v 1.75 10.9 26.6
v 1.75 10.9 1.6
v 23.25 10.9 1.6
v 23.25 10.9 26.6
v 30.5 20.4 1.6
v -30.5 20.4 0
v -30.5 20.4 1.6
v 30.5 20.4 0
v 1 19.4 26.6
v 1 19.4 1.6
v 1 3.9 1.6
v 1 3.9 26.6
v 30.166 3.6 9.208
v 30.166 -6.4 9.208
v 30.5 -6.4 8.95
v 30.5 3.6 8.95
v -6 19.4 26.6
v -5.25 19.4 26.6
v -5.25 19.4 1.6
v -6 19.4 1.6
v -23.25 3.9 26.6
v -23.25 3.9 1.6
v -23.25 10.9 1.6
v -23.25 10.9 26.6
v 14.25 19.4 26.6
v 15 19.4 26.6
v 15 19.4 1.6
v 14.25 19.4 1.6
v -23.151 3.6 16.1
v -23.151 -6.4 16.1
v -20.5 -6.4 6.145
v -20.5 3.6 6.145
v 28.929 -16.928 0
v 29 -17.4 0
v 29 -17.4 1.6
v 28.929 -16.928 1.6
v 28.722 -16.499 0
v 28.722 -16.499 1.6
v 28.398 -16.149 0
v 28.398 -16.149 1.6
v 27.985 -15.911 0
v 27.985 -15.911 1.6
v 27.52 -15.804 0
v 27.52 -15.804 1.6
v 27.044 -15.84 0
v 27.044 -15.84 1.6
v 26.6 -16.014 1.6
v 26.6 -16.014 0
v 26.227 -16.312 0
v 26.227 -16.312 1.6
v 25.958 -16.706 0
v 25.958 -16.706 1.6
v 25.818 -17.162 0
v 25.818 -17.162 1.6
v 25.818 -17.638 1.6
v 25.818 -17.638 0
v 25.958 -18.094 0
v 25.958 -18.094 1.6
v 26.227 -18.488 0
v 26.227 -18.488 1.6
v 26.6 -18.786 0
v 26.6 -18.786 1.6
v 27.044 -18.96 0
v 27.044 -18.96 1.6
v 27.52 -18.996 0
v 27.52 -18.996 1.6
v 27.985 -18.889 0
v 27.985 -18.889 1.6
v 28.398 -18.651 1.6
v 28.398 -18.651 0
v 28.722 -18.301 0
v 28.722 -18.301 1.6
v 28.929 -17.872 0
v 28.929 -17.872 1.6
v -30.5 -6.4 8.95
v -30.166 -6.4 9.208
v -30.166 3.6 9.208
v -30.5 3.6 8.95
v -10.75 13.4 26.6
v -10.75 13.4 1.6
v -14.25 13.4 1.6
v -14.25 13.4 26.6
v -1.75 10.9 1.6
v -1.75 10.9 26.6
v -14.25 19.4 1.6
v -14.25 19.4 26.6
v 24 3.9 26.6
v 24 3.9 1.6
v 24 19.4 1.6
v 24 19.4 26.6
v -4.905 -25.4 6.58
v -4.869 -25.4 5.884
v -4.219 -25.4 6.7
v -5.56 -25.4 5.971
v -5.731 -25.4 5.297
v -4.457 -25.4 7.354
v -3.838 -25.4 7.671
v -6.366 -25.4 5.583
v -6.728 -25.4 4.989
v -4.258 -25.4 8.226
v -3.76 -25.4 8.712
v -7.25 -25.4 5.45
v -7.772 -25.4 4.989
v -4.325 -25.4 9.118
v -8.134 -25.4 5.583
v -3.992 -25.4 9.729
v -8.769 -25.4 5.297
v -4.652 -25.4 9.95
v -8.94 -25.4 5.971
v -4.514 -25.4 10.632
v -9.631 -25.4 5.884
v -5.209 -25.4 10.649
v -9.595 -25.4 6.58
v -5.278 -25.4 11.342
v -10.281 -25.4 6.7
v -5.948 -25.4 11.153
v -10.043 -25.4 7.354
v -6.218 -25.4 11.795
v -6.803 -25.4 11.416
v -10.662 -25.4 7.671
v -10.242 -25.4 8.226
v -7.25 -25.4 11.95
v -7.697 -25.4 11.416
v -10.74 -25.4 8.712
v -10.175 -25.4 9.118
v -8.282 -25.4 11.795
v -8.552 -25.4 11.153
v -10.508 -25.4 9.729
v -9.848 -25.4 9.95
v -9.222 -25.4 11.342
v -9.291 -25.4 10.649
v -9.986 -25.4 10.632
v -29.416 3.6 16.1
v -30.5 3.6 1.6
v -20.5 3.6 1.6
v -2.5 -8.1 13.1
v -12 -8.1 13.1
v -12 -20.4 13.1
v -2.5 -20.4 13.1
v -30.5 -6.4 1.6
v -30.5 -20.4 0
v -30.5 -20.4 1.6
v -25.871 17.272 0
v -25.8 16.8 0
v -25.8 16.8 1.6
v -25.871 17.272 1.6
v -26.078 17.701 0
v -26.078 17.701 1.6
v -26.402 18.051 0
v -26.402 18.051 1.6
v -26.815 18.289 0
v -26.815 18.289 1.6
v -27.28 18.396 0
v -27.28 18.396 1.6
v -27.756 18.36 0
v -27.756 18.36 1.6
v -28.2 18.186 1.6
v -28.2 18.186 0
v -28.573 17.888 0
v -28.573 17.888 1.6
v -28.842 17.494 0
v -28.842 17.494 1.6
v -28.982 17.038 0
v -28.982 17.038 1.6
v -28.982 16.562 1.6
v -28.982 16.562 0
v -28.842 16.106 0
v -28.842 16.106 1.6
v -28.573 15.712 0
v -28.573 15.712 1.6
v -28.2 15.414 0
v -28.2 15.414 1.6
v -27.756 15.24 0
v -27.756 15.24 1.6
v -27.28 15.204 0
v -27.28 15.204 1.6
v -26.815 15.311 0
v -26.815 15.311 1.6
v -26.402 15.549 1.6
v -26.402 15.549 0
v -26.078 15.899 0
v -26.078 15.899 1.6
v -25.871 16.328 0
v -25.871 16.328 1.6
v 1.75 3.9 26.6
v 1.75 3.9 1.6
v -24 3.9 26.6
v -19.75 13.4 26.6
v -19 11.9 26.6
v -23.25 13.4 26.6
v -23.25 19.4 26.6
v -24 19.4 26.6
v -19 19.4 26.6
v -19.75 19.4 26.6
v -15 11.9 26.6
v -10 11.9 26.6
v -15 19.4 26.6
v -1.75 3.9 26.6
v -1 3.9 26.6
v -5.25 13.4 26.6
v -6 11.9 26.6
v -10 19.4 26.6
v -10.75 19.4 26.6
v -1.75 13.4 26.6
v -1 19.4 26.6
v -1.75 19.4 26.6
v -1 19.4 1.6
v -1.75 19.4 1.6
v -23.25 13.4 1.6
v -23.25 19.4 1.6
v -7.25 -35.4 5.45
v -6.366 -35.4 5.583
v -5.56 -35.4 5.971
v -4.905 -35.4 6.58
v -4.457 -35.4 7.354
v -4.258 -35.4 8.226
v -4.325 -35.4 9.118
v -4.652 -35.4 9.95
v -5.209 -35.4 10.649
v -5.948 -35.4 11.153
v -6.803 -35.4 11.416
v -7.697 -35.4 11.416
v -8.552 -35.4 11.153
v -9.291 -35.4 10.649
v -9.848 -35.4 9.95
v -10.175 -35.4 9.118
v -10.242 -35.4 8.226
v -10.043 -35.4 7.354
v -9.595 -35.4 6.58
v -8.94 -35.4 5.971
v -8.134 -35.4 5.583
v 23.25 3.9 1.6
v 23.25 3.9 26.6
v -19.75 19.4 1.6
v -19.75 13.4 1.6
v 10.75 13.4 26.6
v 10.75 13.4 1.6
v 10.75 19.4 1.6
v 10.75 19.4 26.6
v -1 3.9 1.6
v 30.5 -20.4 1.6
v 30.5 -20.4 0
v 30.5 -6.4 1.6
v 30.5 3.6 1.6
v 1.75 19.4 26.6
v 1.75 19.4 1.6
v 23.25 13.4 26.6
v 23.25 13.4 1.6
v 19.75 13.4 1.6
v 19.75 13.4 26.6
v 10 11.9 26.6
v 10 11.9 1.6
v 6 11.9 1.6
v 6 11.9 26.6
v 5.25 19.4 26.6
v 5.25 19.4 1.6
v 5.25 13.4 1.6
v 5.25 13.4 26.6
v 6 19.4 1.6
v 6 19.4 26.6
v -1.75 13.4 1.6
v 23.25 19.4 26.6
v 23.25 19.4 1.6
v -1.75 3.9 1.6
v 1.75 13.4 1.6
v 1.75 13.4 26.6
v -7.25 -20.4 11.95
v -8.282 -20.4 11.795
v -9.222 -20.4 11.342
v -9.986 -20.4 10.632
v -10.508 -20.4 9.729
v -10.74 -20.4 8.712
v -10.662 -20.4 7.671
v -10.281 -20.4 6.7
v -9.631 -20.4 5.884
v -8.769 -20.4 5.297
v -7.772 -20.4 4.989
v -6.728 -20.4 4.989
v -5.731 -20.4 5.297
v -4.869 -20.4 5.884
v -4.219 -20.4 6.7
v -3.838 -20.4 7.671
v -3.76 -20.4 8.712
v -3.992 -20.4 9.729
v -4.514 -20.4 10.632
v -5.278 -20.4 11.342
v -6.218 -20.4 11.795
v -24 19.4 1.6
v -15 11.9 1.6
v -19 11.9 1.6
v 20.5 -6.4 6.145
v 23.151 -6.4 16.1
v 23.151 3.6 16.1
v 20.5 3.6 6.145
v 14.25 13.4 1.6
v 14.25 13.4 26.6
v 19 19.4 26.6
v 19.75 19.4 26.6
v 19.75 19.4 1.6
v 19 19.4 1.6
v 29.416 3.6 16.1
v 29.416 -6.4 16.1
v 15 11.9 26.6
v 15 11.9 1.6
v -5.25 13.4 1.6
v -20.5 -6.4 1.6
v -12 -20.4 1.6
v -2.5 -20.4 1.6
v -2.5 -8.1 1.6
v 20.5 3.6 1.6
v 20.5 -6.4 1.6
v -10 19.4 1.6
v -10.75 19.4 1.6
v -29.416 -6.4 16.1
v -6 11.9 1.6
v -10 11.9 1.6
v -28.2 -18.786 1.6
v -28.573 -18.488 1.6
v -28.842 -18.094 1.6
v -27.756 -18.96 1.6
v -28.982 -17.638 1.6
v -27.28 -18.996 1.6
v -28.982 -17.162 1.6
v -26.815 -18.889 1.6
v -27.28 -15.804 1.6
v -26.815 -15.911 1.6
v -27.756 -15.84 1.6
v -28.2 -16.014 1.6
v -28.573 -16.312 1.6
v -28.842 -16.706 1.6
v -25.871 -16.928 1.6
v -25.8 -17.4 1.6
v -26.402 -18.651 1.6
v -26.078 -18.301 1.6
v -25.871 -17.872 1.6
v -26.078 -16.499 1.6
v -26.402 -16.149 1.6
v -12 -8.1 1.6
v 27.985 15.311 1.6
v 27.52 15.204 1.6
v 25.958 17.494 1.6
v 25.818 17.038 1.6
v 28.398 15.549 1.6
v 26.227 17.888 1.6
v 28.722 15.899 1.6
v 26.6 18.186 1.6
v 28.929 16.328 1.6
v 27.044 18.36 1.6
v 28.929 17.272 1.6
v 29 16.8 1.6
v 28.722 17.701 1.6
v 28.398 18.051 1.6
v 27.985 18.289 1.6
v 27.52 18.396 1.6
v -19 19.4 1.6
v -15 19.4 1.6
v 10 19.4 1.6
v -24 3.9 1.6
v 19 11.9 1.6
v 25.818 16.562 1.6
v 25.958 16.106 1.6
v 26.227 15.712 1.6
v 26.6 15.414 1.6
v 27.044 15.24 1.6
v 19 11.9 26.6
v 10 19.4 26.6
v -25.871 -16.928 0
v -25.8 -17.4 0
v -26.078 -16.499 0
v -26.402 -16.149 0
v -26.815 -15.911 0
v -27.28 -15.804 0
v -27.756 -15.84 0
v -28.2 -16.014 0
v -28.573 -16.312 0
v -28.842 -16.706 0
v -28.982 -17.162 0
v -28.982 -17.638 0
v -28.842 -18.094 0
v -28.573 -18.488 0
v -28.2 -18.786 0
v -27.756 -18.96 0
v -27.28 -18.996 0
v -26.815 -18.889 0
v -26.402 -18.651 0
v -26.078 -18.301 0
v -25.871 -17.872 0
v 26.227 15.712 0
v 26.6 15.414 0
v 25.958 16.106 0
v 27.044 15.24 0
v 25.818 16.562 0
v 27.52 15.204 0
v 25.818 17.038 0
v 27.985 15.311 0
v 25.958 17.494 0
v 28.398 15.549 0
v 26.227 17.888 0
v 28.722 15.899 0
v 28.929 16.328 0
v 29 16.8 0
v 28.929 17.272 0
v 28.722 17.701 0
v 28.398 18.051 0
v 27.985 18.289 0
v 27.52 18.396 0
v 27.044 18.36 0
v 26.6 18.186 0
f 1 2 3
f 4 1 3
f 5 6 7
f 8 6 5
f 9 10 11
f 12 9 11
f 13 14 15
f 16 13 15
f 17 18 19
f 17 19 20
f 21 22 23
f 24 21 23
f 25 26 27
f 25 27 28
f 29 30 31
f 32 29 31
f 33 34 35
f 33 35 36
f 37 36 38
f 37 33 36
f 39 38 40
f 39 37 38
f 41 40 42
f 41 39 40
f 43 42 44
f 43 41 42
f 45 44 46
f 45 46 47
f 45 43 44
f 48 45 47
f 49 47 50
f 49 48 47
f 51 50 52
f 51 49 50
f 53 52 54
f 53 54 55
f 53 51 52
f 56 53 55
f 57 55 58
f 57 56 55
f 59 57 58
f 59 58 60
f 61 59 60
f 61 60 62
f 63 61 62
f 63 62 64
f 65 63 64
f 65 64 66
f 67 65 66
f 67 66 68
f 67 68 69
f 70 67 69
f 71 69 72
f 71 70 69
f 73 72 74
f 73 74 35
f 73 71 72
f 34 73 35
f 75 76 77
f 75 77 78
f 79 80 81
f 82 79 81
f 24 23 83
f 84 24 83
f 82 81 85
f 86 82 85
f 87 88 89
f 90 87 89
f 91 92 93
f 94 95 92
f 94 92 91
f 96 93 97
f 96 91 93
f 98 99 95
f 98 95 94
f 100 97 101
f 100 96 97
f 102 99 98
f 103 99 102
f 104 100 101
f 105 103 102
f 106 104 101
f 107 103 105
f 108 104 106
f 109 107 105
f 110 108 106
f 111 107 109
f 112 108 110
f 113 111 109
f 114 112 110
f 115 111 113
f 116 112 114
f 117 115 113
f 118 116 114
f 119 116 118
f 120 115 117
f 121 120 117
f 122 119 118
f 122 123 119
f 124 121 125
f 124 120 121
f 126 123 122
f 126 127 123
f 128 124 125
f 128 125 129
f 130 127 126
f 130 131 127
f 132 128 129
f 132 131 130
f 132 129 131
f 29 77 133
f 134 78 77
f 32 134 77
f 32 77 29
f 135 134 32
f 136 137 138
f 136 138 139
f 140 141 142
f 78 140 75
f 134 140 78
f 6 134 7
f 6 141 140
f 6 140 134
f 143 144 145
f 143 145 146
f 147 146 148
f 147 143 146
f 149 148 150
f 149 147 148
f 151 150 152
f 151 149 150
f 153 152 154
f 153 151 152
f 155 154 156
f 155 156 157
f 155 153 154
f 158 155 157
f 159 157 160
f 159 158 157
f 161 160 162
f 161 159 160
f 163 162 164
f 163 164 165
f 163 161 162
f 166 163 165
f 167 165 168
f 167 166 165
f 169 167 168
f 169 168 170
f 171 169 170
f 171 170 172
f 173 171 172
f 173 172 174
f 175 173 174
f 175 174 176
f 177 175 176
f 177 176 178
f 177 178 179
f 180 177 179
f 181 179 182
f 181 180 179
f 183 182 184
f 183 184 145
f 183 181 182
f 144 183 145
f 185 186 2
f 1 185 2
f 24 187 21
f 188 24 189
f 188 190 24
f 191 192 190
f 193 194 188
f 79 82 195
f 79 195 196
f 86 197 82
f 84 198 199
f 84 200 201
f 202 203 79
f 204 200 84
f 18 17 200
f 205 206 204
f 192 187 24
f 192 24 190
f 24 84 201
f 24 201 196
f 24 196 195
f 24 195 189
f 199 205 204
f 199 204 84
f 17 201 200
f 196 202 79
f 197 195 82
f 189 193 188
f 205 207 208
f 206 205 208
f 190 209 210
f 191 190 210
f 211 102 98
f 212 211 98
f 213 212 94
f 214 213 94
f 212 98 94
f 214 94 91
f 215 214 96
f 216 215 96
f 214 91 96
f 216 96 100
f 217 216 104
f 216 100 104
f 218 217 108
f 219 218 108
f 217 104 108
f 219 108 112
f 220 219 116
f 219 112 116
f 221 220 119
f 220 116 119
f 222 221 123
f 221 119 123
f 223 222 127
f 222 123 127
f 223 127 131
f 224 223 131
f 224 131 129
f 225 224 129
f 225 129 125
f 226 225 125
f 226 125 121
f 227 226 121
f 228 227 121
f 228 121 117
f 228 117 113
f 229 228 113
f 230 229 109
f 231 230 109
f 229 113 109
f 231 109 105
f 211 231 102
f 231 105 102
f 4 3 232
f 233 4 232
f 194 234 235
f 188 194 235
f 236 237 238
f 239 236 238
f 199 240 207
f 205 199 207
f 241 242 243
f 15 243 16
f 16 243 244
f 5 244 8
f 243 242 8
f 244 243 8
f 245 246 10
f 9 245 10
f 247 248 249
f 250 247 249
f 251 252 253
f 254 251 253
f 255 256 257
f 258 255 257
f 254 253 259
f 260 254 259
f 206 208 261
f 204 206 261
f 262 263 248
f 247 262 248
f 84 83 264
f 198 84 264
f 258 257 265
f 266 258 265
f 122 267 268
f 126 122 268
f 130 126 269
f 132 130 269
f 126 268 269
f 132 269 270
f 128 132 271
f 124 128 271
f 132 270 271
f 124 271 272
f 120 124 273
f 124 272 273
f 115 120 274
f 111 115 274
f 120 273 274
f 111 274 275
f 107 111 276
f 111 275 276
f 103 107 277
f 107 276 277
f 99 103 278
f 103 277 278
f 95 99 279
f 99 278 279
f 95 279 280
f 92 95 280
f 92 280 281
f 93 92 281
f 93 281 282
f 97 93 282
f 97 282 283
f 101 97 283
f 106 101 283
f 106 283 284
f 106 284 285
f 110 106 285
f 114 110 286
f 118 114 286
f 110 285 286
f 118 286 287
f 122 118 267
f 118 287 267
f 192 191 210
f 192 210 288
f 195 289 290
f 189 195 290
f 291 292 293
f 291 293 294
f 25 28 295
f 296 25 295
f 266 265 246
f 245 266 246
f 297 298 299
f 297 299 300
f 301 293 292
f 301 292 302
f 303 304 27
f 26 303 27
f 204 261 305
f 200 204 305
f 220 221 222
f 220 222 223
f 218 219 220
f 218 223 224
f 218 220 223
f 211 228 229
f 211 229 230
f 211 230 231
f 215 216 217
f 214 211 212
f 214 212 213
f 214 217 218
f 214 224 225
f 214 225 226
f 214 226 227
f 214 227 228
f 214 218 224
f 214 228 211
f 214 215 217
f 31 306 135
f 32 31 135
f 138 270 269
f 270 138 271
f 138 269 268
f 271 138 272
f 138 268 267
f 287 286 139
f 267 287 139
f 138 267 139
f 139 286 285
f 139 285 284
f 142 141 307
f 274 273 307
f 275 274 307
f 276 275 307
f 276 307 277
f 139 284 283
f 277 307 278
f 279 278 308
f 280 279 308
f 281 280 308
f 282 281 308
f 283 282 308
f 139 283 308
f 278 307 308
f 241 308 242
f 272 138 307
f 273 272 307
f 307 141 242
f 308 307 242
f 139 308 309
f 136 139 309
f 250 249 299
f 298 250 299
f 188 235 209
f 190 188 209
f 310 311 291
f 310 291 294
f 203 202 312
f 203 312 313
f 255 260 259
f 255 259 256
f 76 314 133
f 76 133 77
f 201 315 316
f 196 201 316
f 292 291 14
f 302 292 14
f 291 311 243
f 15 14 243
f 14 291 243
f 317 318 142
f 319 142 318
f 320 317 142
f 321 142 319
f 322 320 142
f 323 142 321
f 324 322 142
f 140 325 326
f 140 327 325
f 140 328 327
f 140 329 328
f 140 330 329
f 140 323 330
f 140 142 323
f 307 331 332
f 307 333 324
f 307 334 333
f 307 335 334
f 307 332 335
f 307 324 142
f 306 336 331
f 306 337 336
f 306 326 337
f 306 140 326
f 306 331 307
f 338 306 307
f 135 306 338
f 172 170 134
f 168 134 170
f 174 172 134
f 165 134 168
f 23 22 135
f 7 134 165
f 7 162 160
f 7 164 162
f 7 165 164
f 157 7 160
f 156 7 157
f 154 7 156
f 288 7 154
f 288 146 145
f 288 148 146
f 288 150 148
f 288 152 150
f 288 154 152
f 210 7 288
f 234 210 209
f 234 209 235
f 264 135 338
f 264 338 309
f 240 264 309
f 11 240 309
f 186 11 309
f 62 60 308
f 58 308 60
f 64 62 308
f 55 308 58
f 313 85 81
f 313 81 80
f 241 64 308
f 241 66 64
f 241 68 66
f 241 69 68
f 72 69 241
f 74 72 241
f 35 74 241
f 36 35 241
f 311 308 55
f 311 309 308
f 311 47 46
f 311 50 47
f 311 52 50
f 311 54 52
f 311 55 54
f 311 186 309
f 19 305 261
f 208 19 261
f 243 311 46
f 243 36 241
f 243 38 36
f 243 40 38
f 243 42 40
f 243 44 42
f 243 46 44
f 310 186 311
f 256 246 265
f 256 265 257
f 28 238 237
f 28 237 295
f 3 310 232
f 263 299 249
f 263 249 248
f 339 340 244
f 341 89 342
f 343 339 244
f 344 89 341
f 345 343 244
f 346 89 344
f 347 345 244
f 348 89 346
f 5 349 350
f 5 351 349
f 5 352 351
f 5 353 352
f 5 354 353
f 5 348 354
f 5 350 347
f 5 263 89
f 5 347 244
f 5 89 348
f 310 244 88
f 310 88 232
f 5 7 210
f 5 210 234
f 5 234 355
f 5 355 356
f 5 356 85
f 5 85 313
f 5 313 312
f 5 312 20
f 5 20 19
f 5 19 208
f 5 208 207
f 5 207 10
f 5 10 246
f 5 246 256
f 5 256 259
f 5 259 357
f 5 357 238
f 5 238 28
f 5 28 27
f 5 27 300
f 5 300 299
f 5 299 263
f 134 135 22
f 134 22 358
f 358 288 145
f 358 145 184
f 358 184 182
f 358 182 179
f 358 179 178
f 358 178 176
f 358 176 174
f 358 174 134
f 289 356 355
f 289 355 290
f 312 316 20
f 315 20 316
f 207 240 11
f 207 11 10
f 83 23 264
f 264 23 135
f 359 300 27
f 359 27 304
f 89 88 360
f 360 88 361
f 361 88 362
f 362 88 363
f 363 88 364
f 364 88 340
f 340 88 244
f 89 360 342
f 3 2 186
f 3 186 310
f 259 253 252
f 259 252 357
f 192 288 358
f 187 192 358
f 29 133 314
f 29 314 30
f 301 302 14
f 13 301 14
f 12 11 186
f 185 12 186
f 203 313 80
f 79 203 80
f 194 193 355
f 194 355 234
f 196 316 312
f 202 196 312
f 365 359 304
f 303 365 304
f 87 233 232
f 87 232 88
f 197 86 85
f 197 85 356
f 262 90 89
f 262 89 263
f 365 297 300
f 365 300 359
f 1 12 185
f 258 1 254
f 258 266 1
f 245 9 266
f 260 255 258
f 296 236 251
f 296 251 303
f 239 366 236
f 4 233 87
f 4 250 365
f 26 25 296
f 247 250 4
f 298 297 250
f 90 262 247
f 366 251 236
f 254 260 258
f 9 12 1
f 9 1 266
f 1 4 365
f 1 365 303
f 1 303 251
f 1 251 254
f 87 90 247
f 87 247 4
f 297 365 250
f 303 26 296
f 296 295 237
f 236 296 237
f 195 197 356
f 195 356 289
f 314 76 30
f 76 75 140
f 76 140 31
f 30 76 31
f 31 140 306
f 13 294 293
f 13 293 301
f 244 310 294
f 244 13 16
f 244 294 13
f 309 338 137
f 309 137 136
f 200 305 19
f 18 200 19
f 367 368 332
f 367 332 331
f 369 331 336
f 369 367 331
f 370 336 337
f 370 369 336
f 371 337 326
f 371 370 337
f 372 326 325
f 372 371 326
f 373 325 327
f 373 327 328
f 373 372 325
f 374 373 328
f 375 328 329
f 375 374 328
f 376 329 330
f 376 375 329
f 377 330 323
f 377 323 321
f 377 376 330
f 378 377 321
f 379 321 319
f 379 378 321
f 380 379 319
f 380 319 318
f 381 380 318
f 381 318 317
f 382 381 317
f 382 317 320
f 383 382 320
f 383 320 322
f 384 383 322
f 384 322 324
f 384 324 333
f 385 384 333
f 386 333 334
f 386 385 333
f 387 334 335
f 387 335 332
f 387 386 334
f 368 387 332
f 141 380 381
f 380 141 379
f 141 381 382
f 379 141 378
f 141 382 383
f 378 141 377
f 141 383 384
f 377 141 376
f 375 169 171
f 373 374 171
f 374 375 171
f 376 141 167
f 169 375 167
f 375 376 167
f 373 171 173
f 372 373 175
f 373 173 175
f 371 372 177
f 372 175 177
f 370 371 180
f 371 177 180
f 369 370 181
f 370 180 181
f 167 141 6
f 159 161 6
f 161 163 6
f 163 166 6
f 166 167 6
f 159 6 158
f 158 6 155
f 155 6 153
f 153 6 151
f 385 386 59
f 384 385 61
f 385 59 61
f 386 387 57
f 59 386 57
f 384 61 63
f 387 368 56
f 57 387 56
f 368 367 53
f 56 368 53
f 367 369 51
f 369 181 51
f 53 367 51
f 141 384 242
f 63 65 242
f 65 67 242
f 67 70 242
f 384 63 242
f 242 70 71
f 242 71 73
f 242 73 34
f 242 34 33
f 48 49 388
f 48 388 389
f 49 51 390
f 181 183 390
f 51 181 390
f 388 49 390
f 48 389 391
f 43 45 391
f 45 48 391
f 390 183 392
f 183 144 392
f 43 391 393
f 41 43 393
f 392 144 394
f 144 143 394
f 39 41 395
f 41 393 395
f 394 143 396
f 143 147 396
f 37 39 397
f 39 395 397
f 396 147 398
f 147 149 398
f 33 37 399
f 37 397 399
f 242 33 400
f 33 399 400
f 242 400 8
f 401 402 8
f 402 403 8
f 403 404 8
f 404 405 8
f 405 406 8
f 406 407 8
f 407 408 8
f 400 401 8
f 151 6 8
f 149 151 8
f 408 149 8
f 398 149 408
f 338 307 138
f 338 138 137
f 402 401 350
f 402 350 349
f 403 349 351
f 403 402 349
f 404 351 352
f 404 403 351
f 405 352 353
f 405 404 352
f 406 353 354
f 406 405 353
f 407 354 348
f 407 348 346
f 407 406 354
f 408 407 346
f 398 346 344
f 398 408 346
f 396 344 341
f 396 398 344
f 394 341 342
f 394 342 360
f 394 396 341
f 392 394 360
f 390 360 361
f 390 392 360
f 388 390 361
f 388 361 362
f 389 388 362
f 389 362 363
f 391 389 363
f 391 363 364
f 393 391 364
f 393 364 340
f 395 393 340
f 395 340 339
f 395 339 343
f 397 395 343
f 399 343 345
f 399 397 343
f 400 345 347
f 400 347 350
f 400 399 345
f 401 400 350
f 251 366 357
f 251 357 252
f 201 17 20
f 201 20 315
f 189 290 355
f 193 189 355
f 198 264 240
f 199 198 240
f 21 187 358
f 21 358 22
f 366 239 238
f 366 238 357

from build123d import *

# Parameters (mm, degrees)
SKETCH2_W           = 61
SKETCH2_H           = 40.8
SKETCH2_R           = 1.6
BOSS_EXTRUDE1_DEPTH = 1.6
BOSS_EXTRUDE2_DEPTH = 25
SKETCH5_W           = 9.5
SKETCH5_H           = 12.3
BOSS_EXTRUDE3_DEPTH = 11.5
SKETCH6_R           = 3.5
BOSS_EXTRUDE4_DEPTH = 5
SKETCH7_R           = 3
BOSS_EXTRUDE5_DEPTH = 10
SKETCH8_W           = 10
SKETCH8_H           = 10
BOSS_EXTRUDE6_DEPTH = 14.5
CUT_EXTRUDE1_DEPTH  = 10


with BuildPart() as part:
    # Sketch2 → Boss-Extrude1 (new body)
    with BuildSketch(Plane.XY):
        Rectangle(SKETCH2_W, SKETCH2_H)
        with Locations((-27.4, 16.8)):
            Circle(SKETCH2_R, mode=Mode.SUBTRACT)
        with Locations((27.4, 16.8)):
            Circle(SKETCH2_R, mode=Mode.SUBTRACT)
        with Locations((-27.4, -17.4)):
            Circle(SKETCH2_R, mode=Mode.SUBTRACT)
        with Locations((27.4, -17.4)):
            Circle(SKETCH2_R, mode=Mode.SUBTRACT)
    extrude(amount=BOSS_EXTRUDE1_DEPTH)

    # Sketch3 → Boss-Extrude2 (add)
    with BuildSketch(Plane.XY.offset(1.6)):
        Polygon((-24, 19.4), (-24, 3.9), (-23.25, 3.9), (-23.25, 10.9), (-1.75, 10.9), (-1.75, 3.9), (-1, 3.9), (-1, 19.4), (-1.75, 19.4), (-1.75, 13.4), (-5.25, 13.4), (-5.25, 19.4), (-6, 19.4), (-6, 11.9), (-10, 11.9), (-10, 19.4), (-10.75, 19.4), (-10.75, 13.4), (-14.25, 13.4), (-14.25, 19.4), (-15, 19.4), (-15, 11.9), (-19, 11.9), (-19, 19.4), (-19.75, 19.4), (-19.75, 13.4), (-23.25, 13.4), (-23.25, 19.4), align=None)
        Polygon((14.25, 19.4), (14.25, 13.4), (10.75, 13.4), (10.75, 19.4), (10, 19.4), (10, 11.9), (6, 11.9), (6, 19.4), (5.25, 19.4), (5.25, 13.4), (1.75, 13.4), (1.75, 19.4), (1, 19.4), (1, 3.9), (1.75, 3.9), (1.75, 10.9), (23.25, 10.9), (23.25, 3.9), (24, 3.9), (24, 19.4), (23.25, 19.4), (23.25, 13.4), (19.75, 13.4), (19.75, 19.4), (19, 19.4), (19, 11.9), (15, 11.9), (15, 19.4), align=None)
    extrude(amount=BOSS_EXTRUDE2_DEPTH)

    # Sketch5 → Boss-Extrude3 (add)
    with BuildSketch(Plane.XY.offset(1.6)):
        with Locations((-7.25, -14.25)):
            Rectangle(SKETCH5_W, SKETCH5_H)
    extrude(amount=BOSS_EXTRUDE3_DEPTH)

    # Sketch6 → Boss-Extrude4 (add)
    with BuildSketch(Plane.XZ.offset(20.4)):
        with Locations(Location((-7.25, 8.45, 0), (0, 0, 90))):
            Circle(SKETCH6_R)
    extrude(amount=BOSS_EXTRUDE4_DEPTH)

    # Sketch7 → Boss-Extrude5 (add)
    with BuildSketch(Plane.XZ.offset(25.4)):
        with Locations(Location((-7.25, 8.45, 0), (0, 0, 270))):
            Circle(SKETCH7_R)
    extrude(amount=BOSS_EXTRUDE5_DEPTH)

    # Sketch8 → Boss-Extrude6 (add)
    with BuildSketch(Plane.XY.offset(1.6)):
        with Locations((-25.5, -1.4)):
            Rectangle(SKETCH8_W, SKETCH8_H)
        with Locations((25.5, -1.4)):
            Rectangle(SKETCH8_W, SKETCH8_H)
    extrude(amount=BOSS_EXTRUDE6_DEPTH)

    # Sketch9 → Cut-Extrude1 (cut)
    with BuildSketch(Plane.XZ.offset(6.4)):
        Polygon((-23.151020569, 16.1), (-20.5, 6.14534258), (-16.249696832, 6.089417538), (-15.914146582, 20.014752918), (-23.095095527, 19.846977793), align=None)
        Polygon((-29.415736124, 16.1), (-30.16614877, 9.208365841), (-30.5, 8.949622517), (-32.813418931, 7.814737758), (-35.128393598, 16.673480385), (-30.436281354, 21.104919727), align=None)
        Polygon((30.436281354, 21.104919727), (29.415736124, 16.1), (30.16614877, 9.208365841), (30.5, 8.949622517), (32.813418931, 7.814737758), (35.128393598, 16.673480385), align=None)
        Polygon((23.095095527, 19.846977793), (23.151020569, 16.1), (20.5, 6.14534258), (16.249696832, 6.089417538), (15.914146582, 20.014752918), align=None)
    extrude(amount=-CUT_EXTRUDE1_DEPTH, mode=Mode.SUBTRACT)


solid = part.part
